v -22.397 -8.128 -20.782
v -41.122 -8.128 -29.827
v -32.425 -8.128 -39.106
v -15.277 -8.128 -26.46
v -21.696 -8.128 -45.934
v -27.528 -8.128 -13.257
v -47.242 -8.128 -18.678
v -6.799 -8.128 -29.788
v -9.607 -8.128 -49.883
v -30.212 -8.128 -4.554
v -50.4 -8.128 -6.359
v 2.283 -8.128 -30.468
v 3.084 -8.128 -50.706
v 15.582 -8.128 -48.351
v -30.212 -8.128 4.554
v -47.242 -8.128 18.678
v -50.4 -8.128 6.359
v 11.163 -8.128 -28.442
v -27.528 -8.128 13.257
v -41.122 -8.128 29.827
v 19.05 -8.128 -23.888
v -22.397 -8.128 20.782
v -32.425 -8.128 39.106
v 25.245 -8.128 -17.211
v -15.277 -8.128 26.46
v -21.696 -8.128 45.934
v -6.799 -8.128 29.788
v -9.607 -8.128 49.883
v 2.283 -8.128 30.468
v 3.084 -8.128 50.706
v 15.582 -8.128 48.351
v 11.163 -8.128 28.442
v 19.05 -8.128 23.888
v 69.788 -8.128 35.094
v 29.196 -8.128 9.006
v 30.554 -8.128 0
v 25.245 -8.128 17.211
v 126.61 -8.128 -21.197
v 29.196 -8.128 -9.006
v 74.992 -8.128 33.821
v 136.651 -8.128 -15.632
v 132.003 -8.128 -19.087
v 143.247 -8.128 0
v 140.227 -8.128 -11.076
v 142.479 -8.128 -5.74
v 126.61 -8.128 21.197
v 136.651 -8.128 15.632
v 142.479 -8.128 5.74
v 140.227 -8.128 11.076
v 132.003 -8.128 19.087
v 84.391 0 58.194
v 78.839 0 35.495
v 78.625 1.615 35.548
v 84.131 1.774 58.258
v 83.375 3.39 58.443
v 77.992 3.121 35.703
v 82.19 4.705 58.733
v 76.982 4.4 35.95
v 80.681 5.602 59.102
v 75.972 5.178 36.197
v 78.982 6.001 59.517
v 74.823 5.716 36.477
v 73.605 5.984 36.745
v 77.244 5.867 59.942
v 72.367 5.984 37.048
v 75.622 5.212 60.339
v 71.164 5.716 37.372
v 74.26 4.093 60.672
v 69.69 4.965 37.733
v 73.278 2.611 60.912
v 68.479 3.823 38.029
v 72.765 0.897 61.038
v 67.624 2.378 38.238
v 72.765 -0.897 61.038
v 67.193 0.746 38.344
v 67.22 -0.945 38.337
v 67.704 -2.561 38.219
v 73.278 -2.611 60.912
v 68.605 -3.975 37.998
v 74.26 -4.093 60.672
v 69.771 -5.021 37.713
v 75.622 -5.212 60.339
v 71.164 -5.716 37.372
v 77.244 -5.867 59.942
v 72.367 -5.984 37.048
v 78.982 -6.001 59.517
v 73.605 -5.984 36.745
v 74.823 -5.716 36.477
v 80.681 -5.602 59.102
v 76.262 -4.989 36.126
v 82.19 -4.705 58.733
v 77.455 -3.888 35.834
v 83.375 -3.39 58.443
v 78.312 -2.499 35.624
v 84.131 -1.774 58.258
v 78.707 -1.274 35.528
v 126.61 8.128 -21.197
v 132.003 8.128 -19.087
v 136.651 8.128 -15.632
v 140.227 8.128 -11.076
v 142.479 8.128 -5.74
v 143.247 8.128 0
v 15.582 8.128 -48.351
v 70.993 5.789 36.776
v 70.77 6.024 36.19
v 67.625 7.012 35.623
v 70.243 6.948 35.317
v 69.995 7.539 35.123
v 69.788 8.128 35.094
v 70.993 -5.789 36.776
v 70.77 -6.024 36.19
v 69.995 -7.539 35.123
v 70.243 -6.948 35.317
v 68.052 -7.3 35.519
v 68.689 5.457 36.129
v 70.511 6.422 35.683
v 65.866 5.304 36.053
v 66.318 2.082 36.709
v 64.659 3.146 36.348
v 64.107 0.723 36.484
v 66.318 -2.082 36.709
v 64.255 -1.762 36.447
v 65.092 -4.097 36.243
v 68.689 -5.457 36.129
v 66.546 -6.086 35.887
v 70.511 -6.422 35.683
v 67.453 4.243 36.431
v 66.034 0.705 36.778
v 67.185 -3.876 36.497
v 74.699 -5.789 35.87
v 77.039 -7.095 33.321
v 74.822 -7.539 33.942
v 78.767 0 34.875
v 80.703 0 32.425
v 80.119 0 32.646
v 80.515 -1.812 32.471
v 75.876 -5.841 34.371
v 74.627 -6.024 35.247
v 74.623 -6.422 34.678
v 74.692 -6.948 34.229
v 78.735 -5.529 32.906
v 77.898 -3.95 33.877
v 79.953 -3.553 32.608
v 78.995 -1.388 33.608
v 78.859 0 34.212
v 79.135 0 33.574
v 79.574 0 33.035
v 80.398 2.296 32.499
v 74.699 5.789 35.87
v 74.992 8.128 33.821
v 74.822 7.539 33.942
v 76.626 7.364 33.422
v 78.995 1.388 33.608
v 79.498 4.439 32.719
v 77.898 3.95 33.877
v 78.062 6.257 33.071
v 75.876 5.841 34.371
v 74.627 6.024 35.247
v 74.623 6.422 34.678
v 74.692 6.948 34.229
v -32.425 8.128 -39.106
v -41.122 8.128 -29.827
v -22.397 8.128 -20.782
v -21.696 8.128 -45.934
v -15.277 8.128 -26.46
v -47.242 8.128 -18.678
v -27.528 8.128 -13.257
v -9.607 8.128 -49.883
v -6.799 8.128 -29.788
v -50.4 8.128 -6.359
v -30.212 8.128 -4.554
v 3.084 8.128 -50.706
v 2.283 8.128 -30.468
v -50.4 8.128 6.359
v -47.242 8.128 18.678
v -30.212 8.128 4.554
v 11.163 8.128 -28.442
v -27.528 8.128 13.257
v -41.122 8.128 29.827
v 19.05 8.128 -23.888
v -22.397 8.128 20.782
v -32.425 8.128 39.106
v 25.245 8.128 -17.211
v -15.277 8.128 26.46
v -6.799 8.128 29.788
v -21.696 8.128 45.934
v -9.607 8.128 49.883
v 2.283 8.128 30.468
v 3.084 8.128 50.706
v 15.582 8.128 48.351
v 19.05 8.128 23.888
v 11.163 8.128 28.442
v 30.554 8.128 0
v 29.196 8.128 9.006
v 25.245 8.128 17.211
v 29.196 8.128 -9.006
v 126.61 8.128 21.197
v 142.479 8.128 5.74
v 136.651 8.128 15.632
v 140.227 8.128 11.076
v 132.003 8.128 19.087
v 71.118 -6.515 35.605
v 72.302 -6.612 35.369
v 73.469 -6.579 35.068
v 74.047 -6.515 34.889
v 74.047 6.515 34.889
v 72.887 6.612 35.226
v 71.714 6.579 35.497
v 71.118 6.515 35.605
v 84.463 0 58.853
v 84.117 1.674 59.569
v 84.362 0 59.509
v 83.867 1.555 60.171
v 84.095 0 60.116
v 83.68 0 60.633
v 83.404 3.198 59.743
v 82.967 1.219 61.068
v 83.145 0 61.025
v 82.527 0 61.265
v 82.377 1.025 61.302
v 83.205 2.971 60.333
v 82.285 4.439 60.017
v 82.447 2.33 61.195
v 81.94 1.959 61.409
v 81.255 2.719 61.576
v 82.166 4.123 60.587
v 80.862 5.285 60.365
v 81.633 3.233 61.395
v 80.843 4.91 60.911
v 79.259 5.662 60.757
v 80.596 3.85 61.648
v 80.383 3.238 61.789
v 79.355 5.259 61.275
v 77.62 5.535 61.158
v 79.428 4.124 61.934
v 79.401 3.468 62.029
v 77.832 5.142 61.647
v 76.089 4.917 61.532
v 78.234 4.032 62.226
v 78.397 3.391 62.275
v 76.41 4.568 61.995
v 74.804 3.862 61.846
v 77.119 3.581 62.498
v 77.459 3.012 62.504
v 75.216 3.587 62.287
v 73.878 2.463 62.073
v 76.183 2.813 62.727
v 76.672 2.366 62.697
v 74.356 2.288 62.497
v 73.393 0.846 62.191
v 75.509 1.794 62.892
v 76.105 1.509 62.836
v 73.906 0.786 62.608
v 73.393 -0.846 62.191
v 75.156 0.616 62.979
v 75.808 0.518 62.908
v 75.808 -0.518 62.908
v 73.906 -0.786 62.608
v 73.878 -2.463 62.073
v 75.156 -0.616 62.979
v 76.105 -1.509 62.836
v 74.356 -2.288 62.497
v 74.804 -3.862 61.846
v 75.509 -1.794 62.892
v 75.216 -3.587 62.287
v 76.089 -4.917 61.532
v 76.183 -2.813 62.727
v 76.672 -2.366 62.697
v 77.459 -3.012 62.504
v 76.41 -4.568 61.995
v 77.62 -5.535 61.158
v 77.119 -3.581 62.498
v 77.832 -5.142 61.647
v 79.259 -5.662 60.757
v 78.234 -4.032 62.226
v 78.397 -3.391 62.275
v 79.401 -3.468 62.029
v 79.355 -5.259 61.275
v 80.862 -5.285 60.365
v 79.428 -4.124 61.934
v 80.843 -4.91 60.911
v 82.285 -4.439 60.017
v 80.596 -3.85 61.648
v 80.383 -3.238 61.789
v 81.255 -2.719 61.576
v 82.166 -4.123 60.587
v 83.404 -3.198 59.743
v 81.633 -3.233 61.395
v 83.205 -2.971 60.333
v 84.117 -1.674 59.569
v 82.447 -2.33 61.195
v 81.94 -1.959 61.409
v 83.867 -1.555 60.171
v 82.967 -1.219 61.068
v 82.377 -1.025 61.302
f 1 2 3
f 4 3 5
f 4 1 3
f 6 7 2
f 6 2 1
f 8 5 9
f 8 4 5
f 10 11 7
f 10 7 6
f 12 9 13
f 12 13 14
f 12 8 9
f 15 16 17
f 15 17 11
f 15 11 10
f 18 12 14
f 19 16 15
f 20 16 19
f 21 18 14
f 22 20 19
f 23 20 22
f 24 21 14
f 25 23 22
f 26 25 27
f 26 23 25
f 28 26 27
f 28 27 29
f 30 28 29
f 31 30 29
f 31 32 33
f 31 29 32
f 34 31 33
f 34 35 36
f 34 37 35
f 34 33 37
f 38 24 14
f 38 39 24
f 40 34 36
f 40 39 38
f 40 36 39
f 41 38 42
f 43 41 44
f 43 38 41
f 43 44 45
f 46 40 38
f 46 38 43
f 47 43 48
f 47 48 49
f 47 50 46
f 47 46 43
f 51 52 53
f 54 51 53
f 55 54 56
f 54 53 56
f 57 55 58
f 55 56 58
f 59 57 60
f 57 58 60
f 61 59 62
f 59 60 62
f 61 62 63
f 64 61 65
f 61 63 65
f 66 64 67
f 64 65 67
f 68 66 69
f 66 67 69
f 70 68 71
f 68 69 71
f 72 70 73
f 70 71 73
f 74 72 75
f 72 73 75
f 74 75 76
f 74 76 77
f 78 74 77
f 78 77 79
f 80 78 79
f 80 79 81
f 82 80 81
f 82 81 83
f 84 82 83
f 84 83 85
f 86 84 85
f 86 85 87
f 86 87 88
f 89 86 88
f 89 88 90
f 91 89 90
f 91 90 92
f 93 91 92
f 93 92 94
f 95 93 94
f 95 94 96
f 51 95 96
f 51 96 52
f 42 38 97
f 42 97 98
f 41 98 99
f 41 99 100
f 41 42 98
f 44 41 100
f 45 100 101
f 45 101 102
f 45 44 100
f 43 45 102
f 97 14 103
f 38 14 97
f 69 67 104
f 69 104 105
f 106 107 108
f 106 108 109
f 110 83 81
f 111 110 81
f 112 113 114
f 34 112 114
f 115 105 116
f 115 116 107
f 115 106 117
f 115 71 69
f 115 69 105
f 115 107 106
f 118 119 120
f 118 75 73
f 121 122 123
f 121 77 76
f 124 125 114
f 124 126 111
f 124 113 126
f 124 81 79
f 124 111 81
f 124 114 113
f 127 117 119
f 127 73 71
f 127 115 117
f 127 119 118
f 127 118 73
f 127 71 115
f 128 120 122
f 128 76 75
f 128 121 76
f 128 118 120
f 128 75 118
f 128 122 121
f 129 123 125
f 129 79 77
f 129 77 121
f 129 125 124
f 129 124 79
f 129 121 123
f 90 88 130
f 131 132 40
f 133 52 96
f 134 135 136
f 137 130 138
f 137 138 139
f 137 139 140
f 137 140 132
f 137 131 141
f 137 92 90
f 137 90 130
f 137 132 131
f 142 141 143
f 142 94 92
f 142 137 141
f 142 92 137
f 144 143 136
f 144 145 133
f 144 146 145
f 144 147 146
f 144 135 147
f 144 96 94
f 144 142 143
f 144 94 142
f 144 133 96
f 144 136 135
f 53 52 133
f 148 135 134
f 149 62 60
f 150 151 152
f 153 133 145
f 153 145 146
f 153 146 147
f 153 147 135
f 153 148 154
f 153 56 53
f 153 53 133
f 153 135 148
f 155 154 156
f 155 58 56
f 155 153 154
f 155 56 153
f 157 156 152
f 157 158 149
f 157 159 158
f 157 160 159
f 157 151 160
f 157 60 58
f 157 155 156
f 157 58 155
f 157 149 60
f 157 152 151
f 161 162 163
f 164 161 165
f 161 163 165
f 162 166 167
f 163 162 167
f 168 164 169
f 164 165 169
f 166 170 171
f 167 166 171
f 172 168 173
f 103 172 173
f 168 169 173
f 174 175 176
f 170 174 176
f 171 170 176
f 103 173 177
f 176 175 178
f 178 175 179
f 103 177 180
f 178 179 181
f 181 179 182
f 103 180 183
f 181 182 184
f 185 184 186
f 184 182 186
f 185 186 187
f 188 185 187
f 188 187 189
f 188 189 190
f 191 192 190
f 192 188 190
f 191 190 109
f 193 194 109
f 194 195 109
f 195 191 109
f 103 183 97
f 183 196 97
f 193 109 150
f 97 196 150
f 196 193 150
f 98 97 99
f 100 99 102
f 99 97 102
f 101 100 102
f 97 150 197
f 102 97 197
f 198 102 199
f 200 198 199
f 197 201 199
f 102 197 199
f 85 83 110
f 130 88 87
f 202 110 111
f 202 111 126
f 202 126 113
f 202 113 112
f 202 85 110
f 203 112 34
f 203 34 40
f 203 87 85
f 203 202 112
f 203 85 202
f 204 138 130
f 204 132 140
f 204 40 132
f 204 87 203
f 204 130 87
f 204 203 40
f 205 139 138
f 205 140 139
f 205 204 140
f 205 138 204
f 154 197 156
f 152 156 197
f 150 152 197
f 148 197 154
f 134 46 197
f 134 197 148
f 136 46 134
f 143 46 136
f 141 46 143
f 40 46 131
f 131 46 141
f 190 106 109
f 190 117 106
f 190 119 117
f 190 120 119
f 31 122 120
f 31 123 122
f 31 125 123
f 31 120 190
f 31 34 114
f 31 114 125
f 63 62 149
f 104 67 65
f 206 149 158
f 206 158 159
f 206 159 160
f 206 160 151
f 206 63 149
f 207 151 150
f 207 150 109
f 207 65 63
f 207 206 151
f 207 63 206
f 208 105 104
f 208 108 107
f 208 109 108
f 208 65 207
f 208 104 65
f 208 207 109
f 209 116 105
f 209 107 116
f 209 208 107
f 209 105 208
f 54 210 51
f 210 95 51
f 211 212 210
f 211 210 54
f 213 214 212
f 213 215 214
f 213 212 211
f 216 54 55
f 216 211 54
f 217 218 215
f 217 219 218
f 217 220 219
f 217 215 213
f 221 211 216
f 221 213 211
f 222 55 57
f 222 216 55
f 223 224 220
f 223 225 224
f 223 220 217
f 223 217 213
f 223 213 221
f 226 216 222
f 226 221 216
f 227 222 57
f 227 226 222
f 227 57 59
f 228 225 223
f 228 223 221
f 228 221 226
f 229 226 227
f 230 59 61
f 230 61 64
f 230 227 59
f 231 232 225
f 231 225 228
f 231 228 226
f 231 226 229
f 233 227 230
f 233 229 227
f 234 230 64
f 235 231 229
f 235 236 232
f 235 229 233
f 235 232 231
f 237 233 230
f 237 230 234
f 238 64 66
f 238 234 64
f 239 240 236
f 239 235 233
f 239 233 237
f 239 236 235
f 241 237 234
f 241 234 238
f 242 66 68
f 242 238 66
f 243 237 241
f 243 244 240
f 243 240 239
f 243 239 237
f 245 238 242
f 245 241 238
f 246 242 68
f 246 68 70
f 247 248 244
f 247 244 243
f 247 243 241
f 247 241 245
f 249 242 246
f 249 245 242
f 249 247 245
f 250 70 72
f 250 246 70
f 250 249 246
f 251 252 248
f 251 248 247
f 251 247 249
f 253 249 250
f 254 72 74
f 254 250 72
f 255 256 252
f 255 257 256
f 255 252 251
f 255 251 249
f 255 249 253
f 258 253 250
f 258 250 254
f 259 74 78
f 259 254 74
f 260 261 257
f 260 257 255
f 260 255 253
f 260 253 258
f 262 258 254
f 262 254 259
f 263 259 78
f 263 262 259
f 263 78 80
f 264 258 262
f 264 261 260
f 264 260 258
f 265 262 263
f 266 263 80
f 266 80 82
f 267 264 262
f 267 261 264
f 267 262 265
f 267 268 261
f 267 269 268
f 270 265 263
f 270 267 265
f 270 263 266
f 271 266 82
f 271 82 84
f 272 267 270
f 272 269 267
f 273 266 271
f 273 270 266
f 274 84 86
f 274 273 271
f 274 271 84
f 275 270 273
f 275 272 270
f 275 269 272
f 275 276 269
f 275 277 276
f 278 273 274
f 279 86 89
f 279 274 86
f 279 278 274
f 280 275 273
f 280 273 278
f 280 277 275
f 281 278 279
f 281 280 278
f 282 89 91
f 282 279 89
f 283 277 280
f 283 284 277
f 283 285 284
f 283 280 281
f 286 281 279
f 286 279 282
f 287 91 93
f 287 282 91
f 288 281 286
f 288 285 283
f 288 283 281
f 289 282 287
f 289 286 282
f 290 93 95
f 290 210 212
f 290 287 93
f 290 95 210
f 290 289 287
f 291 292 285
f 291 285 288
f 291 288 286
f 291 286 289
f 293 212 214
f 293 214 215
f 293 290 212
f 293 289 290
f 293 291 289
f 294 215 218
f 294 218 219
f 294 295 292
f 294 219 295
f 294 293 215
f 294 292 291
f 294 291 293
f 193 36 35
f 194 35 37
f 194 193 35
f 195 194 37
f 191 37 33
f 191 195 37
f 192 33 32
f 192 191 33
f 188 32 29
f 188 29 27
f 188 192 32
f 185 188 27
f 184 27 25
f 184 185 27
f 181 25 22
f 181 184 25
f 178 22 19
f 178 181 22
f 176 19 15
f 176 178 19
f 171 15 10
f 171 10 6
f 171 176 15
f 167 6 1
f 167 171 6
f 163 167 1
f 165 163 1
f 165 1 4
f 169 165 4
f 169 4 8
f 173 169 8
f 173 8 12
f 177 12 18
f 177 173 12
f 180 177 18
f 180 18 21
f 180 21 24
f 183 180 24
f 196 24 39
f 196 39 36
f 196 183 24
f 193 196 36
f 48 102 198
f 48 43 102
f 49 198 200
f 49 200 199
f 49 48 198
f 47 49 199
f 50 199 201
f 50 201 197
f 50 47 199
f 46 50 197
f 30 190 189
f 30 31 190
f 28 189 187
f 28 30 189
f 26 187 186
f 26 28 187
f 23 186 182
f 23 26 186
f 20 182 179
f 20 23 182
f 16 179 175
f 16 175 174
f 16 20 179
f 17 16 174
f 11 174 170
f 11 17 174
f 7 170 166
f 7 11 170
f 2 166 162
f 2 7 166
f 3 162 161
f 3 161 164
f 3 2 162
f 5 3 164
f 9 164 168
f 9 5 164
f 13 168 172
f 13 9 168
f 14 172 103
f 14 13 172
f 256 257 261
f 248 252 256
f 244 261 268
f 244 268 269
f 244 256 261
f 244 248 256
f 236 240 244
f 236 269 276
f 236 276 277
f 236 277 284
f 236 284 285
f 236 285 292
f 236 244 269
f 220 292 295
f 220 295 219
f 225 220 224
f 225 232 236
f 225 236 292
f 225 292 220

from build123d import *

# Parameters (mm, degrees)
F0_R     = 30.553649
F1_DEPTH = 8.128
F2_R     = 6.018054
F3_DEPTH = 28.448
F4_R     = 2.54


with BuildPart() as f1:
    # F0 (on Front) → F1 (new body, symmetric)
    with BuildSketch(Plane.XZ):
        with BuildLine():
            ThreePointArc((15.581804, -48.351291), (41.062122, -29.908898), (50.8, 0))
            ThreePointArc((50.8, 0), (41.062122, 29.908898), (15.581804, 48.351291))
            ThreePointArc((15.581804, 48.351291), (-50.8, 0), (15.581804, -48.351291))
        make_face()
        Circle(F0_R, mode=Mode.SUBTRACT)
        with BuildLine():
            ThreePointArc((15.581804, 48.351291), (41.062122, 29.908898), (50.8, 0))
            ThreePointArc((50.8, 0), (41.062122, -29.908898), (15.581804, -48.351291))
            Line((15.581804, -48.351291), (126.609508, -21.197307))
            ThreePointArc((126.609508, -21.197307), (99.603244, 0), (126.609508, 21.197307))
            Line((126.609508, 21.197307), (15.581804, 48.351291))
        make_face()
        with BuildLine():
            ThreePointArc((143.247345, 0), (138.591134, 13.473524), (126.609508, 21.197307))
            ThreePointArc((126.609508, 21.197307), (99.603244, 0), (126.609508, -21.197307))
            ThreePointArc((126.609508, -21.197307), (138.591134, -13.473524), (143.247345, 0))
        make_face()
    extrude(amount=F1_DEPTH, both=True)

    # F2 (on face) → F3 (join)
    with BuildSketch(Plane(origin=(12.037263, 0, 49.218178), x_dir=(0.971371, 0, -0.237568), z_dir=(0.237568, 0, 0.971371))):
        with Locations((62.131673, 0)):
            Circle(F2_R)
    extrude(amount=F3_DEPTH)

    # F4
    f4_edges = [f1.edges().sort_by_distance(p)[0] for p in [
        (73.302729, 0, 63.520958),
        (66.544404, 0, 35.887396),
    ]]
    fillet(f4_edges, radius=F4_R)


solid = f1.part
